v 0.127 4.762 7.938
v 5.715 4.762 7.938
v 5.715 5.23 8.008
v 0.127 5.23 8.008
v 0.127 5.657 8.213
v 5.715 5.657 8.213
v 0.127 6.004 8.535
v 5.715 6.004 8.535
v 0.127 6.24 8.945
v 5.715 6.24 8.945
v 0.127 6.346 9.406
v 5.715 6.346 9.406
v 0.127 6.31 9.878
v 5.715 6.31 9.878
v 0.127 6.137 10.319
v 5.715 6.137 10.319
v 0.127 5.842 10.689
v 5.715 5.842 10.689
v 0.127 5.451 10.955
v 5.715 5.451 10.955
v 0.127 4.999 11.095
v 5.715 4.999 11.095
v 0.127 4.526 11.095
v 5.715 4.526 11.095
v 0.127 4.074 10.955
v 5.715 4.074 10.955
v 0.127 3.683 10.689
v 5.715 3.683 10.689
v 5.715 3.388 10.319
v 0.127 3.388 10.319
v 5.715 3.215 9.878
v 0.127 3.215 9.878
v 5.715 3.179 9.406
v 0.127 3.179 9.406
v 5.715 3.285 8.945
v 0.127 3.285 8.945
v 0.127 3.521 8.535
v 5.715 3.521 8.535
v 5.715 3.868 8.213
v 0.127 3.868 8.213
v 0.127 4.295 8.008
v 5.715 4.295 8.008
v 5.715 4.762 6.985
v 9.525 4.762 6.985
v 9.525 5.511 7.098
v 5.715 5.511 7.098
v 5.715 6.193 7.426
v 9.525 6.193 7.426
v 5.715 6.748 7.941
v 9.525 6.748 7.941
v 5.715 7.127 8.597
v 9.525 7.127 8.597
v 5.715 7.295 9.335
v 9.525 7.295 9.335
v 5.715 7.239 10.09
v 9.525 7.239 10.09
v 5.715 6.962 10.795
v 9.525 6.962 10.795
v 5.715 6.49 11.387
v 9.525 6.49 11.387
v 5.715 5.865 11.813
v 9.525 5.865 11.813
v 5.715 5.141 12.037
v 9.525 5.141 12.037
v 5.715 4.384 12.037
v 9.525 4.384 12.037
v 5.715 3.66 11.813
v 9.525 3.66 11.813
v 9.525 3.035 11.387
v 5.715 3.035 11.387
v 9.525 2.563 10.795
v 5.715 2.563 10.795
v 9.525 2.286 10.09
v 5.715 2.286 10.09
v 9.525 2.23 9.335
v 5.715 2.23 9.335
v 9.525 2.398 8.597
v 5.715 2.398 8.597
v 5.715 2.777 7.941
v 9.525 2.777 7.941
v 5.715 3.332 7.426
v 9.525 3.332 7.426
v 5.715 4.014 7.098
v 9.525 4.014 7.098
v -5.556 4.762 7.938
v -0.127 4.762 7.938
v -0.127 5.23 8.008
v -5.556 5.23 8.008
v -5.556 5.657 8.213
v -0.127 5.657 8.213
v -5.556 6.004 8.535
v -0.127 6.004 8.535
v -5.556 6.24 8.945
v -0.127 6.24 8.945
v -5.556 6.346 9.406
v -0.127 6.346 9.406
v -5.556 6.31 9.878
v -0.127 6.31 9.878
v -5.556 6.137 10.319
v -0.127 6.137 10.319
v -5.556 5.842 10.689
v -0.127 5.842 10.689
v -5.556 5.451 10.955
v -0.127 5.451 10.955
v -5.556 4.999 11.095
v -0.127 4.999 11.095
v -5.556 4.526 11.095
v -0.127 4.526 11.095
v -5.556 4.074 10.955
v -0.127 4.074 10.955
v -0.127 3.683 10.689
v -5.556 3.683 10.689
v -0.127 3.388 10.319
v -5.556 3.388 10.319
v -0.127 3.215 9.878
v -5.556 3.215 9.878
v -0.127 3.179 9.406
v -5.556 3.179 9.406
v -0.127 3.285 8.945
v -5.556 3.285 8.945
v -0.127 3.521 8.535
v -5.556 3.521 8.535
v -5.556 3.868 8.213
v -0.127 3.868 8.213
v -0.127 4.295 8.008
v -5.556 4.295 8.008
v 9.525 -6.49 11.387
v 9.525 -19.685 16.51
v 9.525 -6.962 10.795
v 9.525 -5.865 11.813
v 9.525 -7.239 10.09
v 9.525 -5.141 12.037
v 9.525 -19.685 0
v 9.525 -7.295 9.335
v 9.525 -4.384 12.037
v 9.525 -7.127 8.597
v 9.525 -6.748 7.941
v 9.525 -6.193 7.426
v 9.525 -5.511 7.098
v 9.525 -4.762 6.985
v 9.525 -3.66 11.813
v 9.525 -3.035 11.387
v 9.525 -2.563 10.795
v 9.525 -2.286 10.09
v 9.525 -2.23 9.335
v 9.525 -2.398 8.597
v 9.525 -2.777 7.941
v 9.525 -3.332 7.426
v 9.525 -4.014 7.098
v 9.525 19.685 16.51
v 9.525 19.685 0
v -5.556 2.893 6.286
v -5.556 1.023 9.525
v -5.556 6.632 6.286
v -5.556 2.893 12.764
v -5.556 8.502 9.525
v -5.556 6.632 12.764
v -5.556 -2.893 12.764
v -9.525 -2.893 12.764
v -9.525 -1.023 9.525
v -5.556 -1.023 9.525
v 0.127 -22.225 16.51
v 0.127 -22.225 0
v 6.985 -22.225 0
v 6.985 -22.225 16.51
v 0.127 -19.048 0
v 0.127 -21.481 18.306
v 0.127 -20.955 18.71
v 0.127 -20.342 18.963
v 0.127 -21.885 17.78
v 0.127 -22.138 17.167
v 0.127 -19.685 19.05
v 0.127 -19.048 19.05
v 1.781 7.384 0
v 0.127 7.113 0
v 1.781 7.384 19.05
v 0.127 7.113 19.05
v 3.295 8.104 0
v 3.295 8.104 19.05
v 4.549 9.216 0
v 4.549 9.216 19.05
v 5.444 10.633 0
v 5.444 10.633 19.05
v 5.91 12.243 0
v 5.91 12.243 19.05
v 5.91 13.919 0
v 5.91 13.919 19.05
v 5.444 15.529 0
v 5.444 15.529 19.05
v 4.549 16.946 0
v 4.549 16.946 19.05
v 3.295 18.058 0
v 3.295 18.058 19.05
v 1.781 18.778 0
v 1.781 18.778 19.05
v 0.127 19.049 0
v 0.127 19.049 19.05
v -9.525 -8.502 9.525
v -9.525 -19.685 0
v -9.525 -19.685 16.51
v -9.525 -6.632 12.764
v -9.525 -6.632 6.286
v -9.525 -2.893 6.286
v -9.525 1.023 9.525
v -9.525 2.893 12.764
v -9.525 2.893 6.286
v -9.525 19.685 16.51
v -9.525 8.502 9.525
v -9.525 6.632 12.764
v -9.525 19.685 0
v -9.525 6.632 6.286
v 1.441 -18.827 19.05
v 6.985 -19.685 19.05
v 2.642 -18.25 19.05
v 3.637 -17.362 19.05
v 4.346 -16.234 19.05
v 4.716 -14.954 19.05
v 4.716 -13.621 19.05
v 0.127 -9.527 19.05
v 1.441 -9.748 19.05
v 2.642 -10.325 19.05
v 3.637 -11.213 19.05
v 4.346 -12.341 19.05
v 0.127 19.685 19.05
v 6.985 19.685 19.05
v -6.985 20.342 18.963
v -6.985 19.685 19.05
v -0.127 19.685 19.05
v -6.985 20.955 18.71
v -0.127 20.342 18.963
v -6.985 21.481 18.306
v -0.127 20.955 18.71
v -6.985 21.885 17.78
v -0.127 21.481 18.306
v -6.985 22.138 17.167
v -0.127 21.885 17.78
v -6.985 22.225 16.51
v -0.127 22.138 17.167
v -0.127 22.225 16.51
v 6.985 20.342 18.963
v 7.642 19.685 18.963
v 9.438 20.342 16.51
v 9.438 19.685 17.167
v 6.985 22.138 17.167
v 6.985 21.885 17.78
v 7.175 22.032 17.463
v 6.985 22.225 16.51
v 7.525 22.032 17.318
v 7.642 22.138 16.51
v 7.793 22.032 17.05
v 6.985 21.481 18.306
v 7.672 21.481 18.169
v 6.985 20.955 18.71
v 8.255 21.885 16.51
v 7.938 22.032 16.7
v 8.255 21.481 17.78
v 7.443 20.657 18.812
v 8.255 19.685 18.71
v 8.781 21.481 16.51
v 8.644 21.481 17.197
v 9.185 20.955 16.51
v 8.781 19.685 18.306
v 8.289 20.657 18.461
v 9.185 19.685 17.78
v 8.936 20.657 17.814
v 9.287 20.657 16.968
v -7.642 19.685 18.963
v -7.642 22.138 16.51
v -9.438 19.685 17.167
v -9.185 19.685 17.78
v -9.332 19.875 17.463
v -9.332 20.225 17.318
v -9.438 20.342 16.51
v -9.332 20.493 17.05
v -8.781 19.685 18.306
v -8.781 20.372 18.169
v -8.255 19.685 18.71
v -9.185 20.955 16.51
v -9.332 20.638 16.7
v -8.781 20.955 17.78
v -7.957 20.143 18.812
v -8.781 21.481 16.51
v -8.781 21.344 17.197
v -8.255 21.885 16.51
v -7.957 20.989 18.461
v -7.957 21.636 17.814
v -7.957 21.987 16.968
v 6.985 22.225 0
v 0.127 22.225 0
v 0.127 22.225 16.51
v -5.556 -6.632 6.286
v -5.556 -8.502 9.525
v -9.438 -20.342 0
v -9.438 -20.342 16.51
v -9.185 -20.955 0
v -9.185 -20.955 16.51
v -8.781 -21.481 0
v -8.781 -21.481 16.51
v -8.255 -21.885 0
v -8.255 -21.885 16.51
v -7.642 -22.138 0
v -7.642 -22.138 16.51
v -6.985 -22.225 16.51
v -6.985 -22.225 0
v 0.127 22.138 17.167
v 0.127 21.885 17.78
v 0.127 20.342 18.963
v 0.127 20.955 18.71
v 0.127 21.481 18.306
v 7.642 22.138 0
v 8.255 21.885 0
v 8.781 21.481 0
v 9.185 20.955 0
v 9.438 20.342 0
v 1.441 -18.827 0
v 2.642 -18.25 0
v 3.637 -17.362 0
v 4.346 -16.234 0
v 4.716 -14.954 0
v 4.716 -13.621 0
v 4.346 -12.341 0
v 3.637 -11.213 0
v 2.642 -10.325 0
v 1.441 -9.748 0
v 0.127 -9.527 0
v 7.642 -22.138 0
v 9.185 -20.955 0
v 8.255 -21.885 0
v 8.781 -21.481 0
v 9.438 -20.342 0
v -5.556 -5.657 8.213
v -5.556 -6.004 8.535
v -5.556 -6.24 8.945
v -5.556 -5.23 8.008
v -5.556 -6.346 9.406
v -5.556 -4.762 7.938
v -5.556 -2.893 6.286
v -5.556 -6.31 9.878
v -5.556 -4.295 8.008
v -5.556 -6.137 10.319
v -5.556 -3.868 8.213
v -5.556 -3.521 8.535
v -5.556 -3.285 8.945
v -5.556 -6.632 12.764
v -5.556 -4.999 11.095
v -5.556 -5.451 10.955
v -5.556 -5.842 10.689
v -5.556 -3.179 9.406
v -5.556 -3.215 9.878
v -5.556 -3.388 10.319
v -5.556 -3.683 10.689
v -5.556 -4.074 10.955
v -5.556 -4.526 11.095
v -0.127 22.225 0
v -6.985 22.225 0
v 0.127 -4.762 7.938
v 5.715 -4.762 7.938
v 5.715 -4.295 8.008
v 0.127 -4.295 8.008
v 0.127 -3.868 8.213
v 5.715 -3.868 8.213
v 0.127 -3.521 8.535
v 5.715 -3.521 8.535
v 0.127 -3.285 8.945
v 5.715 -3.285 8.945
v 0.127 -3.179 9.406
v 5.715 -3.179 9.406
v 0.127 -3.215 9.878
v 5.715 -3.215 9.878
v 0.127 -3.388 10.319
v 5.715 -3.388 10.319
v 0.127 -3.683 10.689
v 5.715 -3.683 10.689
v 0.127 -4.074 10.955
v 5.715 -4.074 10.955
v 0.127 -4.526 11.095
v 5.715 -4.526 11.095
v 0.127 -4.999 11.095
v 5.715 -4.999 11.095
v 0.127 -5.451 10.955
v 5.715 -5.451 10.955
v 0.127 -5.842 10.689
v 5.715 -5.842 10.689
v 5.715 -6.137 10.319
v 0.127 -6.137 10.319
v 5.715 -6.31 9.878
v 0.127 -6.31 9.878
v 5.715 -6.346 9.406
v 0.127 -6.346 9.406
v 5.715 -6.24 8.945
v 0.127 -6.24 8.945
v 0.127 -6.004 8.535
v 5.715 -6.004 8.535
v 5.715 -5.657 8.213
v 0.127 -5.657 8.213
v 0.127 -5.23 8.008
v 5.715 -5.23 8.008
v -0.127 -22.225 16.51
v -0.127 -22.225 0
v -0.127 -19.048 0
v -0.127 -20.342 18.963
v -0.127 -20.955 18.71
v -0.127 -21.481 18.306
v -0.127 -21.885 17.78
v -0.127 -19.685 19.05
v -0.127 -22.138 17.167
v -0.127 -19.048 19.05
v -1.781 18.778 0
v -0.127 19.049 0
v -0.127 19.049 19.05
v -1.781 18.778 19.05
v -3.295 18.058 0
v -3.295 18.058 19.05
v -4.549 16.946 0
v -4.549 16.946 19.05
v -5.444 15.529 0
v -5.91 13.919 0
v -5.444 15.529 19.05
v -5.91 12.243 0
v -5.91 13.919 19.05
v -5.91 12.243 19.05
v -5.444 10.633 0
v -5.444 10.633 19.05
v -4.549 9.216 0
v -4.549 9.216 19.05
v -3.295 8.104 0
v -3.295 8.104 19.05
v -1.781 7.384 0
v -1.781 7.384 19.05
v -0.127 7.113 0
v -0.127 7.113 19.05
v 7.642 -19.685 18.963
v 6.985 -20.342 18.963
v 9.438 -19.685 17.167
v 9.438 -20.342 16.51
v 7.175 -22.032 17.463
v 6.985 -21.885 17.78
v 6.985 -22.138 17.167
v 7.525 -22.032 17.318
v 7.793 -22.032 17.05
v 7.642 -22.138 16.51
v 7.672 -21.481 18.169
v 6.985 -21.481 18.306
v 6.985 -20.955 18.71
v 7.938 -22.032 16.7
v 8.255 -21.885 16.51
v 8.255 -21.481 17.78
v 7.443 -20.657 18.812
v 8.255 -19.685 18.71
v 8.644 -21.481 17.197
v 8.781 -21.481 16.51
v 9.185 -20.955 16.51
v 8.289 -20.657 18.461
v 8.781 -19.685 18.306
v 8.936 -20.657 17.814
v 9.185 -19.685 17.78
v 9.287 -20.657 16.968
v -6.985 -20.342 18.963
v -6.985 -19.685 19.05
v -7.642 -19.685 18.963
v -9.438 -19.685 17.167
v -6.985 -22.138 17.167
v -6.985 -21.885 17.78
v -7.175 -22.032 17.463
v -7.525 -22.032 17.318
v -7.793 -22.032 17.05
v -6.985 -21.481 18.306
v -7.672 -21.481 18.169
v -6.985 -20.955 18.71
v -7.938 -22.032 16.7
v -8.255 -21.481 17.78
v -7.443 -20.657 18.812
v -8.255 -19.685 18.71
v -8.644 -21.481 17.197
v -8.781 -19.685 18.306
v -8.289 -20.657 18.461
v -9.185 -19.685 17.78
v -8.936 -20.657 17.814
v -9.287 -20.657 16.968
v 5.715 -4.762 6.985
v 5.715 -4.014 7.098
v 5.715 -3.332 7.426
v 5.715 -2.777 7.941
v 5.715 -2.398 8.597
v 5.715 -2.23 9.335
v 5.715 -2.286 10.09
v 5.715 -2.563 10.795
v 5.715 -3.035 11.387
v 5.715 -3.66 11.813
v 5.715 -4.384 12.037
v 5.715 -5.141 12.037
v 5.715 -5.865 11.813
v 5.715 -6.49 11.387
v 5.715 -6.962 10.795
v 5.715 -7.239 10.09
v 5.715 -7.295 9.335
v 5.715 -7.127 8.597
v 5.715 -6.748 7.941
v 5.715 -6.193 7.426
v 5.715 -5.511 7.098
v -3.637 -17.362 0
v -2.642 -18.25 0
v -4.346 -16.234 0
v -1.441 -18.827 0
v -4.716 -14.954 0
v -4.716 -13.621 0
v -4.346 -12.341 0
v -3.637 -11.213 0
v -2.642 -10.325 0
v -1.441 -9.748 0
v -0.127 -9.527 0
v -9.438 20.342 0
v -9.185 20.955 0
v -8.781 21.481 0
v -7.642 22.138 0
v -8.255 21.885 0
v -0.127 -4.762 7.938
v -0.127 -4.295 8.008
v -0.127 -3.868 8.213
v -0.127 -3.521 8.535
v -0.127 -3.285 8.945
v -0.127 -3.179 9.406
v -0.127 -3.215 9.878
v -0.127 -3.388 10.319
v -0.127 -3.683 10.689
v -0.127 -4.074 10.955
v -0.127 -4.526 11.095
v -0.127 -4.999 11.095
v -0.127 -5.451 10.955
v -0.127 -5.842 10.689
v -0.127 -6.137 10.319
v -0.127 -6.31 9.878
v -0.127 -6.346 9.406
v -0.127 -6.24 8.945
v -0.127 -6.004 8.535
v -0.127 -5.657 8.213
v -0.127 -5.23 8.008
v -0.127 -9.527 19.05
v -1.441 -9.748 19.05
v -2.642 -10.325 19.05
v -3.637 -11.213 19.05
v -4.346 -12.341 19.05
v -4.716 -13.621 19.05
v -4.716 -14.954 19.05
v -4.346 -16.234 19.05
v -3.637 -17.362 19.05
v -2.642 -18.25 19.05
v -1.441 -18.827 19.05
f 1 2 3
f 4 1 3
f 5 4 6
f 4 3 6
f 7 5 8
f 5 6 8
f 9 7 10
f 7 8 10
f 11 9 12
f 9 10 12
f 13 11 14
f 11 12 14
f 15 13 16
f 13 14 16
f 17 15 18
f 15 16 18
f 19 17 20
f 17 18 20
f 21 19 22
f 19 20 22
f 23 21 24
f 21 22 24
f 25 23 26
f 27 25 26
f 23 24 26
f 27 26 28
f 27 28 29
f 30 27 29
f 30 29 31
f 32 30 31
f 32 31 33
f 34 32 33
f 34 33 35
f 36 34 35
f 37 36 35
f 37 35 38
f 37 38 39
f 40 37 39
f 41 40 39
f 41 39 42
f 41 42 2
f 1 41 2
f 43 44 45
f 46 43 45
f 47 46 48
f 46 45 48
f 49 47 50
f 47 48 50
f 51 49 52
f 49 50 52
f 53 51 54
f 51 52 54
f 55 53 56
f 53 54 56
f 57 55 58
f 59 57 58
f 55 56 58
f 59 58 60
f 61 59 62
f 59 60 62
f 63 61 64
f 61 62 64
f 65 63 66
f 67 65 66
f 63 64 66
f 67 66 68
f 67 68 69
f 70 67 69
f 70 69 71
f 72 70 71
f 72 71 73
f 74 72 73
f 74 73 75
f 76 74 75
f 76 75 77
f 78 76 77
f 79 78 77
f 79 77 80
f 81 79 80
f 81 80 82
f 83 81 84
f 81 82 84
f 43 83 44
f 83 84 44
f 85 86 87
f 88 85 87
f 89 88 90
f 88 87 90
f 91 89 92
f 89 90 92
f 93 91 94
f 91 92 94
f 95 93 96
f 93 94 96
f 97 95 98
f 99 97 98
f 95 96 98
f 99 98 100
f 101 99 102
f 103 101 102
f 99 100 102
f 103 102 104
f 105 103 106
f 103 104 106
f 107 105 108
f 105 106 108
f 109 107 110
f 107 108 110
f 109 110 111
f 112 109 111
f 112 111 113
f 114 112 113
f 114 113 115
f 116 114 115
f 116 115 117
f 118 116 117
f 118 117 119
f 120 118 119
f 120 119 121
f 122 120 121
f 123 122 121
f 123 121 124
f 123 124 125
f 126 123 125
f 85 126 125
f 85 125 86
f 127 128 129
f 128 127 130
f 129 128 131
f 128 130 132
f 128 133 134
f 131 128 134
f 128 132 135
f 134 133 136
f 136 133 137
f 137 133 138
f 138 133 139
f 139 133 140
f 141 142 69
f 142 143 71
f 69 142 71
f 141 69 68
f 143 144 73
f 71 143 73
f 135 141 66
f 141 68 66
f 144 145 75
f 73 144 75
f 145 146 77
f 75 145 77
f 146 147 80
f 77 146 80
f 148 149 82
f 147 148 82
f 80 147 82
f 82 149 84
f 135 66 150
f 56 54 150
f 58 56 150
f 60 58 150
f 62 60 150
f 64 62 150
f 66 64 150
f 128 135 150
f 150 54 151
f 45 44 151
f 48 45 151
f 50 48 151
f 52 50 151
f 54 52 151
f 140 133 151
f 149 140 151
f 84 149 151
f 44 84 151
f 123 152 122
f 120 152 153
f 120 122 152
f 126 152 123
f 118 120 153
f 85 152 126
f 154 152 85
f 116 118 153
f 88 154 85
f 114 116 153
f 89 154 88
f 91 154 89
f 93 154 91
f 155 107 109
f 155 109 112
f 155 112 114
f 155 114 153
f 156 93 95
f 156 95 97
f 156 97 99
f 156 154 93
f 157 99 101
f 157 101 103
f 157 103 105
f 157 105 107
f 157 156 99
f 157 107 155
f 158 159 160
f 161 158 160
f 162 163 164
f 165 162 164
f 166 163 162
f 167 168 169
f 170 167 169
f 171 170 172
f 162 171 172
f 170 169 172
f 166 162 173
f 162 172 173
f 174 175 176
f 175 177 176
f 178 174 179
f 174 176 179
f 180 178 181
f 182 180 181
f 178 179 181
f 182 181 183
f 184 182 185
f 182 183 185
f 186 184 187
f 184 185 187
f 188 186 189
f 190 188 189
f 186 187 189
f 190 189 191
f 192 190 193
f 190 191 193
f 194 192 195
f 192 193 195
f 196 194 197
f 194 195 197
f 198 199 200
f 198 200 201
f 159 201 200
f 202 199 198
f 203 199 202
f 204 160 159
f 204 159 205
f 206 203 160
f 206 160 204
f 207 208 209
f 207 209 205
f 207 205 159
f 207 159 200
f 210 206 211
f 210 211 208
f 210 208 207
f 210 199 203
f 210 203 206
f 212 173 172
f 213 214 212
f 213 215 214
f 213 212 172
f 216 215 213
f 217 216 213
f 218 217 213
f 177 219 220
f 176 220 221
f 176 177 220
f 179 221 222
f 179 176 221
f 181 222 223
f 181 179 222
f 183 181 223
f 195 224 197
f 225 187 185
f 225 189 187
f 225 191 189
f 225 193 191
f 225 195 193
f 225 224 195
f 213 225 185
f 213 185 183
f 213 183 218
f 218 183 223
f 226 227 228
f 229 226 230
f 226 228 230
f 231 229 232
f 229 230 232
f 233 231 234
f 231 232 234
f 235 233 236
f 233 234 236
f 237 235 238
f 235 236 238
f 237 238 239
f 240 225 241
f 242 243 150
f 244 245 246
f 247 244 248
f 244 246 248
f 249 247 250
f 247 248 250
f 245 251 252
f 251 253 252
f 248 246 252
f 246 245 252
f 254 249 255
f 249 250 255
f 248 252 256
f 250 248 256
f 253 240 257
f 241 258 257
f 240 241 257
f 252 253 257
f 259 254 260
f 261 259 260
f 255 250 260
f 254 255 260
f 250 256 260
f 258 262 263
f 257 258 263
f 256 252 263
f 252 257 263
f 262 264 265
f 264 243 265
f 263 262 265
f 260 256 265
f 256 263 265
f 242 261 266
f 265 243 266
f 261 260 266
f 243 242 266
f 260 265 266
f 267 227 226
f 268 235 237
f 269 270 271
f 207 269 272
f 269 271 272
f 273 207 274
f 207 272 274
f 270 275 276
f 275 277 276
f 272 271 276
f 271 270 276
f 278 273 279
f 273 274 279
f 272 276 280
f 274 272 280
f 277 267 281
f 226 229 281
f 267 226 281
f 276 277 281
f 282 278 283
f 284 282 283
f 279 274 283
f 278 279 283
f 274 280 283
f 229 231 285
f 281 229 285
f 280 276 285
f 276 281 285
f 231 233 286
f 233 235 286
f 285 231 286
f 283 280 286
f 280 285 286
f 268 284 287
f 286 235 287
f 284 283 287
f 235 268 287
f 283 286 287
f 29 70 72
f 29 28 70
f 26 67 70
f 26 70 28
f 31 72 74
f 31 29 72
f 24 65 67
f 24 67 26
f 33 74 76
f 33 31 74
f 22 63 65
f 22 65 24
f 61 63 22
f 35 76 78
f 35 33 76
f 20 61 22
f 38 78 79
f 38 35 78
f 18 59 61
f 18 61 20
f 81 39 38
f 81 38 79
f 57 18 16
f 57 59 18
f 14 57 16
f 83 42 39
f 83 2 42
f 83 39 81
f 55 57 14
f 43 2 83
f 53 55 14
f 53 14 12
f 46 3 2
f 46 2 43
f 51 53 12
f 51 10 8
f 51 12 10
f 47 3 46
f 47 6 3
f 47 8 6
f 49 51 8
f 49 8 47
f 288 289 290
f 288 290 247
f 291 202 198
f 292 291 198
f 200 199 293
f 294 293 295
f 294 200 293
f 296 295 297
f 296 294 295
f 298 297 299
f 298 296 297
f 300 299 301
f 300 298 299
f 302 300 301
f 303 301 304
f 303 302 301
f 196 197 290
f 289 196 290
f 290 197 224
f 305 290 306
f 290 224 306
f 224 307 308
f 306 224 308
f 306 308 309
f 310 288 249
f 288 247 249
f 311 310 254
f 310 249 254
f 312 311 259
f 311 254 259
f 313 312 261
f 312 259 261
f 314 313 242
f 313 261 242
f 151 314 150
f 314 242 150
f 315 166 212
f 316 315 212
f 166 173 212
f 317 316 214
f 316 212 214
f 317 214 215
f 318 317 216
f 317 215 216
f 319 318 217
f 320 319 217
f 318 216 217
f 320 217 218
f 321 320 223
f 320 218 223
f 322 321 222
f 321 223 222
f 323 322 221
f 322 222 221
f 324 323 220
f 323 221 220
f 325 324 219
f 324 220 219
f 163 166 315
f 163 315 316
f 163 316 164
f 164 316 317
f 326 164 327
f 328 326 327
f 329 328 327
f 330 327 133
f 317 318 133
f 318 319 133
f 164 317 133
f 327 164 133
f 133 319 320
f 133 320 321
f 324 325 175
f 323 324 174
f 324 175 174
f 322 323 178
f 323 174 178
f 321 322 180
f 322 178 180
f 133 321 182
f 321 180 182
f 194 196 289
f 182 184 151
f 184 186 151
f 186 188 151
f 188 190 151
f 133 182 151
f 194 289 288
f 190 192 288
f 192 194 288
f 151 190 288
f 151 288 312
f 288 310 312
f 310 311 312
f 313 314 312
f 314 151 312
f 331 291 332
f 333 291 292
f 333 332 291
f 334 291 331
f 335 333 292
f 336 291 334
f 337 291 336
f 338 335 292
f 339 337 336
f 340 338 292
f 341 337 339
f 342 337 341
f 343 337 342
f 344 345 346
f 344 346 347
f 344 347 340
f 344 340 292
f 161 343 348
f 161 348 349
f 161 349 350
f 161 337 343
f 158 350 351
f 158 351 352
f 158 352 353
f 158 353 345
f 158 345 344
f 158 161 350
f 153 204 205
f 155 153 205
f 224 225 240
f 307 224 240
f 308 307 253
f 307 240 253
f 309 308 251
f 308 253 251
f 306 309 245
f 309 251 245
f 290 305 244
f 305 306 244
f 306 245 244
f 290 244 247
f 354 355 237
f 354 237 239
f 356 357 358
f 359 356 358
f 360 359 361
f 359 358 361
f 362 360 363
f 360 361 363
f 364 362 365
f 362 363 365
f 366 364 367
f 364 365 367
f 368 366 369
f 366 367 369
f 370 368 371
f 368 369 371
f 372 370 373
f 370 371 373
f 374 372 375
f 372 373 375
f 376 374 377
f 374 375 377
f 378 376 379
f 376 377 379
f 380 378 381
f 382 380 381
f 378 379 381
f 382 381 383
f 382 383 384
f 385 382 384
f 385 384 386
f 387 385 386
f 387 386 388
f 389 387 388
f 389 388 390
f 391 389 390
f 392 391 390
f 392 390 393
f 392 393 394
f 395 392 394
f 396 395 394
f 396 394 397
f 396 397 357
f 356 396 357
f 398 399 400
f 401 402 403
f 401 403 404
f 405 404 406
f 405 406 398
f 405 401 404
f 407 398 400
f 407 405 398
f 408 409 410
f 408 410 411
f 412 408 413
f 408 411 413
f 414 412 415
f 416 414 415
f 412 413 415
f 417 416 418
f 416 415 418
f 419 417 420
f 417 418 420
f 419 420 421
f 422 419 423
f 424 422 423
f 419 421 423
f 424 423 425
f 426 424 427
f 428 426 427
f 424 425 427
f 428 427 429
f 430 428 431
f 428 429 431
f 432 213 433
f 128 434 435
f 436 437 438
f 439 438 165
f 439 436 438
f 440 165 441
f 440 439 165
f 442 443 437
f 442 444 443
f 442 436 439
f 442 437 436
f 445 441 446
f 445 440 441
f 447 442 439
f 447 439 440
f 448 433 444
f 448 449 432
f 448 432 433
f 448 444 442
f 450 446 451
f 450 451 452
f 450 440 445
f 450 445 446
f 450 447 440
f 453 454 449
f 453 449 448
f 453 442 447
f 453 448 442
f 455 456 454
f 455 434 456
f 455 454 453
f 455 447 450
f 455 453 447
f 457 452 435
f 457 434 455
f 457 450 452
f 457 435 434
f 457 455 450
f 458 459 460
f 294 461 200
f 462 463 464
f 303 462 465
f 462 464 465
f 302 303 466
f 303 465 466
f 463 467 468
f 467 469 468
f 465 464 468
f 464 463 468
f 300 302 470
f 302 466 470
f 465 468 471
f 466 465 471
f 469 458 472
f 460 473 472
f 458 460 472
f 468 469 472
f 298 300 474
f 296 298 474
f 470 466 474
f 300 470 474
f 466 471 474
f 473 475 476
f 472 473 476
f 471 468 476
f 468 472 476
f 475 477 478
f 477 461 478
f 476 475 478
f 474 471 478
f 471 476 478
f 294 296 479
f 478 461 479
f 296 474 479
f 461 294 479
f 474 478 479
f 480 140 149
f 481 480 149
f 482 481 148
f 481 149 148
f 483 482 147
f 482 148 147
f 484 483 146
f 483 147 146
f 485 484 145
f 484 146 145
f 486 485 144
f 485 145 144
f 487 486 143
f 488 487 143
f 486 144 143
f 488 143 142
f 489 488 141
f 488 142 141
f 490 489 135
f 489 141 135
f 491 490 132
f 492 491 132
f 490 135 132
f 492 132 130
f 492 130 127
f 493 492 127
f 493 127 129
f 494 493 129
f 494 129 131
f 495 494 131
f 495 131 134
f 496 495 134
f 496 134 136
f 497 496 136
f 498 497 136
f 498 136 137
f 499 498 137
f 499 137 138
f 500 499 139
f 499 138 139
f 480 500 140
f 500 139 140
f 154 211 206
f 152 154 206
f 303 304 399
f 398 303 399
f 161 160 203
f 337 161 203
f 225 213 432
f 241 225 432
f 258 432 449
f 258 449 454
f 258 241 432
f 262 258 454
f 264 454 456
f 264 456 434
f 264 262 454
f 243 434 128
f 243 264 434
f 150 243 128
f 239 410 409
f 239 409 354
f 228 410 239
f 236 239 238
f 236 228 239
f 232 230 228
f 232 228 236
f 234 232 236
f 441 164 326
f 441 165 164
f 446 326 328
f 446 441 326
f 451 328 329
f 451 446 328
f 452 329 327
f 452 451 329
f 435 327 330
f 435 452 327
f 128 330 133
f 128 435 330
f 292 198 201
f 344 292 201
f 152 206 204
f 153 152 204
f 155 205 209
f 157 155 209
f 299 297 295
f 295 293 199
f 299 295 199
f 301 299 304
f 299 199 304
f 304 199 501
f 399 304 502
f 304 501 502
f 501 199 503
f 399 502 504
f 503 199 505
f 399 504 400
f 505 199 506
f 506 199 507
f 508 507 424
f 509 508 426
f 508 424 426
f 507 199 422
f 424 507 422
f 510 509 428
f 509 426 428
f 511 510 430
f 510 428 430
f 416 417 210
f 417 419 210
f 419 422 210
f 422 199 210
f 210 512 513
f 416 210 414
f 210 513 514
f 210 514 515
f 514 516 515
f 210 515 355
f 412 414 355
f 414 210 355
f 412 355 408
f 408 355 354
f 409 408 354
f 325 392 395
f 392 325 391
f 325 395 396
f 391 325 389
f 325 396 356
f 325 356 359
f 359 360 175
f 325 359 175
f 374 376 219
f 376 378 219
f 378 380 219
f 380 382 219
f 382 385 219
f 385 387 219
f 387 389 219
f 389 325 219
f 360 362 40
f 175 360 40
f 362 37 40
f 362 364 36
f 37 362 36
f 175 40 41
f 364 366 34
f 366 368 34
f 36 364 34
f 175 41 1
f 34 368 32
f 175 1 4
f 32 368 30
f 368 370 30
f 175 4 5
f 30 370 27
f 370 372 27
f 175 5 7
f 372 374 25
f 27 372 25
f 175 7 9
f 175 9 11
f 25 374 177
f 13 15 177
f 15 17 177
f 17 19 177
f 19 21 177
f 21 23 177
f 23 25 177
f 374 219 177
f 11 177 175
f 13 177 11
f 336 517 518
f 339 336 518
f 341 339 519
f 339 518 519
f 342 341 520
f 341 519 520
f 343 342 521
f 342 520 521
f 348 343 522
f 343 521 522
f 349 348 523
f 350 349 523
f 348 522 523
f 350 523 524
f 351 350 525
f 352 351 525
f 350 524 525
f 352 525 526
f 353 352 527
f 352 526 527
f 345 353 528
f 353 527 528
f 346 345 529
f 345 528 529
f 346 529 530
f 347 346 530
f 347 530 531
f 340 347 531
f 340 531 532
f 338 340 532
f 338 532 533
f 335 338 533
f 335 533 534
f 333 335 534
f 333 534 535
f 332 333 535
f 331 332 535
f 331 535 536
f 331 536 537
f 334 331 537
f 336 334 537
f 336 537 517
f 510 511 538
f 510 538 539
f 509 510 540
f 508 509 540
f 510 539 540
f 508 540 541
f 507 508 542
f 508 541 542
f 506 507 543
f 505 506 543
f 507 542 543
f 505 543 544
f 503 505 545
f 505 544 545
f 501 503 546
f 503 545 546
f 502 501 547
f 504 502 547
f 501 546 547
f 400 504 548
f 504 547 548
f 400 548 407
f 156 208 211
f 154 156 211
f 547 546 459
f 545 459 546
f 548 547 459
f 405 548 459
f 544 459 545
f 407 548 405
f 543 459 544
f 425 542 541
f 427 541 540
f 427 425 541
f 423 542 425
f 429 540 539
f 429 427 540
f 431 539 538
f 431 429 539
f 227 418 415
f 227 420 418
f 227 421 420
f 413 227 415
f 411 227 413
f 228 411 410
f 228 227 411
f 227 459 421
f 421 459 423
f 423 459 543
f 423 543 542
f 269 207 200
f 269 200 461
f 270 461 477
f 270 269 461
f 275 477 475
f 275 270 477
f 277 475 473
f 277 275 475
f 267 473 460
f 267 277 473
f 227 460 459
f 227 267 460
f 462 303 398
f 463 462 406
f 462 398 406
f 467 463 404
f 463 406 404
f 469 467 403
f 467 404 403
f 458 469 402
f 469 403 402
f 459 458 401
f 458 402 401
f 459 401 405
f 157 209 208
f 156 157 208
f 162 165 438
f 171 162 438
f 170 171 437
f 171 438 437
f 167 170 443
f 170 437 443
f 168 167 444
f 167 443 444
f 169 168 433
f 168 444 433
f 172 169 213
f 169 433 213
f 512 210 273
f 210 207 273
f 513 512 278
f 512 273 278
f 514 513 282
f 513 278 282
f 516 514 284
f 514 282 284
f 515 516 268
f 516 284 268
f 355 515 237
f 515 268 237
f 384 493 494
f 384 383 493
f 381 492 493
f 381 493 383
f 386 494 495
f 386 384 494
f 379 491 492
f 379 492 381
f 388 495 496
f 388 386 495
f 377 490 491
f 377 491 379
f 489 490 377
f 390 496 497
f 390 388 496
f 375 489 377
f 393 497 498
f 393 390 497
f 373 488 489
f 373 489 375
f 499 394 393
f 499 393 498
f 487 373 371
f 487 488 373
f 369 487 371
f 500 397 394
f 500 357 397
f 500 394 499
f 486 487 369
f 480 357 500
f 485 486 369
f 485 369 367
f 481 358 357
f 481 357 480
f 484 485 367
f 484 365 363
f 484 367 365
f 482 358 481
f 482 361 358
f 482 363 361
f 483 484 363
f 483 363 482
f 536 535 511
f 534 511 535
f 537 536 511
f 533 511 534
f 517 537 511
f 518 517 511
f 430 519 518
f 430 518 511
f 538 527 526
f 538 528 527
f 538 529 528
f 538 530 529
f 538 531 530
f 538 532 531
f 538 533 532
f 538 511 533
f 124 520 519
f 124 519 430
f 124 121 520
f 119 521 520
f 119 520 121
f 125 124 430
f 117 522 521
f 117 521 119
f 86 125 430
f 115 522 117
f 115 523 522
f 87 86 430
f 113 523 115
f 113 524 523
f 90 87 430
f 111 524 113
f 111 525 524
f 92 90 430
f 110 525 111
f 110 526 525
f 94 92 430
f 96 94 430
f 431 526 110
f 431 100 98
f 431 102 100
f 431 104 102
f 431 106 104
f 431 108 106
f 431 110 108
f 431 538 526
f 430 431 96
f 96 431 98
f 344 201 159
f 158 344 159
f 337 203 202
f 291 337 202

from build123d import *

# Parameters (mm, degrees)
SKETCH1_W           = 19.05
SKETCH1_H           = 44.45
BOSS_EXTRUDE1_DEPTH = 19.05
CUT_EXTRUDE1_REACH  = 21.05
SKETCH2_R           = 5.969
SKETCH2_R_2         = 4.7625
CUT_EXTRUDE2_REACH  = 21.05
SKETCH3_R           = 1.5875
SKETCH6_R           = 2.54
CUT_EXTRUDE5_DEPTH  = 3.81
CUT_EXTRUDE3_DEPTH  = 3.96875
FILLET1_R           = 2.54
CUT_EXTRUDE4_START  = -19.05
SKETCH5_W           = 0.254
SKETCH5_H           = 44.45
CUT_EXTRUDE4_DEPTH  = 19.05


with BuildPart() as part:
    # Sketch1 → Boss-Extrude1 (new body)
    with BuildSketch(Plane.XY):
        Rectangle(SKETCH1_W, SKETCH1_H)
    extrude(amount=BOSS_EXTRUDE1_DEPTH)

    # Sketch2 → Cut-Extrude1 (cut, up to next)
    with BuildSketch(Plane.XY.offset(19.05), mode=Mode.PRIVATE) as cut_extrude1_sk1:
        with Locations((0, 13.081)):
            Circle(SKETCH2_R)
    cut_extrude1_tool1 = extrude(cut_extrude1_sk1.sketch, amount=-CUT_EXTRUDE1_REACH, mode=Mode.PRIVATE) & part.part
    add(cut_extrude1_tool1.solids().sort_by_distance((0, 13.081, 19.05))[0], mode=Mode.SUBTRACT)
    # Sketch2 → Cut-Extrude1 (cut, up to next)
    with BuildSketch(Plane.XY.offset(19.05), mode=Mode.PRIVATE) as cut_extrude1_sk2:
        with Locations((0, -14.2875)):
            Circle(SKETCH2_R_2)
    cut_extrude1_tool2 = extrude(cut_extrude1_sk2.sketch, amount=-CUT_EXTRUDE1_REACH, mode=Mode.PRIVATE) & part.part
    add(cut_extrude1_tool2.solids().sort_by_distance((0, -14.2875, 19.05))[0], mode=Mode.SUBTRACT)

    # Sketch3 → Cut-Extrude2 (cut, up to next)
    with BuildSketch(Plane(origin=(9.525, 0, 0), x_dir=(0, 0, -1), z_dir=(1, 0, 0)), mode=Mode.PRIVATE) as cut_extrude2_sk1:
        with Locations((-9.525, -4.7625)):
            Circle(SKETCH3_R)
    cut_extrude2_tool1 = extrude(cut_extrude2_sk1.sketch, amount=-CUT_EXTRUDE2_REACH, mode=Mode.PRIVATE) & part.part
    add(cut_extrude2_tool1.solids().sort_by_distance((9.525, -4.7625, 9.525))[0], mode=Mode.SUBTRACT)
    # Sketch3 → Cut-Extrude2 (cut, up to next)
    with BuildSketch(Plane(origin=(9.525, 0, 0), x_dir=(0, 0, -1), z_dir=(1, 0, 0)), mode=Mode.PRIVATE) as cut_extrude2_sk2:
        with Locations((-9.525, 4.7625)):
            Circle(SKETCH3_R)
    cut_extrude2_tool2 = extrude(cut_extrude2_sk2.sketch, amount=-CUT_EXTRUDE2_REACH, mode=Mode.PRIVATE) & part.part
    add(cut_extrude2_tool2.solids().sort_by_distance((9.525, 4.7625, 9.525))[0], mode=Mode.SUBTRACT)

    # Sketch6 → Cut-Extrude5 (cut)
    with BuildSketch(Plane(origin=(9.525, 0, 0), x_dir=(0, 0, -1), z_dir=(1, 0, 0))):
        with Locations((-9.525, -4.7625)):
            Circle(SKETCH6_R)
        with Locations((-9.525, 4.7625)):
            Circle(SKETCH6_R)
    extrude(amount=-CUT_EXTRUDE5_DEPTH, mode=Mode.SUBTRACT)

    # Sketch4 → Cut-Extrude3 (cut)
    with BuildSketch(Plane.ZY.offset(9.525)):
        Polygon((9.525, 1.023002306), (12.7635, 2.892751153), (12.7635, 6.632248847), (9.525, 8.501997694), (6.2865, 6.632248847), (6.2865, 2.892751153), align=None)
        Polygon((9.525, -8.501997694), (12.7635, -6.632248847), (12.7635, -2.892751153), (9.525, -1.023002306), (6.2865, -2.892751153), (6.2865, -6.632248847), align=None)
    extrude(amount=-CUT_EXTRUDE3_DEPTH, mode=Mode.SUBTRACT)

    # Fillet1
    fillet1_edges = [part.edges().sort_by_distance(p)[0] for p in [
        (9.525, 0, 19.05),
        (0, 22.225, 19.05),
        (-9.525, 0, 19.05),
        (0, -22.225, 19.05),
        (-9.525, 22.225, 9.525),
        (9.525, 22.225, 9.525),
        (9.525, -22.225, 9.525),
        (-9.525, -22.225, 9.525),
    ]]
    fillet(fillet1_edges, radius=FILLET1_R)

    # Sketch5 → Cut-Extrude4 (cut)
    with BuildSketch(Plane(origin=(0, 0, 0), x_dir=(-1, 0, 0), z_dir=(0, 0, -1)).offset(CUT_EXTRUDE4_START)):
        Rectangle(SKETCH5_W, SKETCH5_H)
    extrude(amount=CUT_EXTRUDE4_DEPTH, mode=Mode.SUBTRACT)


solid = part.part
